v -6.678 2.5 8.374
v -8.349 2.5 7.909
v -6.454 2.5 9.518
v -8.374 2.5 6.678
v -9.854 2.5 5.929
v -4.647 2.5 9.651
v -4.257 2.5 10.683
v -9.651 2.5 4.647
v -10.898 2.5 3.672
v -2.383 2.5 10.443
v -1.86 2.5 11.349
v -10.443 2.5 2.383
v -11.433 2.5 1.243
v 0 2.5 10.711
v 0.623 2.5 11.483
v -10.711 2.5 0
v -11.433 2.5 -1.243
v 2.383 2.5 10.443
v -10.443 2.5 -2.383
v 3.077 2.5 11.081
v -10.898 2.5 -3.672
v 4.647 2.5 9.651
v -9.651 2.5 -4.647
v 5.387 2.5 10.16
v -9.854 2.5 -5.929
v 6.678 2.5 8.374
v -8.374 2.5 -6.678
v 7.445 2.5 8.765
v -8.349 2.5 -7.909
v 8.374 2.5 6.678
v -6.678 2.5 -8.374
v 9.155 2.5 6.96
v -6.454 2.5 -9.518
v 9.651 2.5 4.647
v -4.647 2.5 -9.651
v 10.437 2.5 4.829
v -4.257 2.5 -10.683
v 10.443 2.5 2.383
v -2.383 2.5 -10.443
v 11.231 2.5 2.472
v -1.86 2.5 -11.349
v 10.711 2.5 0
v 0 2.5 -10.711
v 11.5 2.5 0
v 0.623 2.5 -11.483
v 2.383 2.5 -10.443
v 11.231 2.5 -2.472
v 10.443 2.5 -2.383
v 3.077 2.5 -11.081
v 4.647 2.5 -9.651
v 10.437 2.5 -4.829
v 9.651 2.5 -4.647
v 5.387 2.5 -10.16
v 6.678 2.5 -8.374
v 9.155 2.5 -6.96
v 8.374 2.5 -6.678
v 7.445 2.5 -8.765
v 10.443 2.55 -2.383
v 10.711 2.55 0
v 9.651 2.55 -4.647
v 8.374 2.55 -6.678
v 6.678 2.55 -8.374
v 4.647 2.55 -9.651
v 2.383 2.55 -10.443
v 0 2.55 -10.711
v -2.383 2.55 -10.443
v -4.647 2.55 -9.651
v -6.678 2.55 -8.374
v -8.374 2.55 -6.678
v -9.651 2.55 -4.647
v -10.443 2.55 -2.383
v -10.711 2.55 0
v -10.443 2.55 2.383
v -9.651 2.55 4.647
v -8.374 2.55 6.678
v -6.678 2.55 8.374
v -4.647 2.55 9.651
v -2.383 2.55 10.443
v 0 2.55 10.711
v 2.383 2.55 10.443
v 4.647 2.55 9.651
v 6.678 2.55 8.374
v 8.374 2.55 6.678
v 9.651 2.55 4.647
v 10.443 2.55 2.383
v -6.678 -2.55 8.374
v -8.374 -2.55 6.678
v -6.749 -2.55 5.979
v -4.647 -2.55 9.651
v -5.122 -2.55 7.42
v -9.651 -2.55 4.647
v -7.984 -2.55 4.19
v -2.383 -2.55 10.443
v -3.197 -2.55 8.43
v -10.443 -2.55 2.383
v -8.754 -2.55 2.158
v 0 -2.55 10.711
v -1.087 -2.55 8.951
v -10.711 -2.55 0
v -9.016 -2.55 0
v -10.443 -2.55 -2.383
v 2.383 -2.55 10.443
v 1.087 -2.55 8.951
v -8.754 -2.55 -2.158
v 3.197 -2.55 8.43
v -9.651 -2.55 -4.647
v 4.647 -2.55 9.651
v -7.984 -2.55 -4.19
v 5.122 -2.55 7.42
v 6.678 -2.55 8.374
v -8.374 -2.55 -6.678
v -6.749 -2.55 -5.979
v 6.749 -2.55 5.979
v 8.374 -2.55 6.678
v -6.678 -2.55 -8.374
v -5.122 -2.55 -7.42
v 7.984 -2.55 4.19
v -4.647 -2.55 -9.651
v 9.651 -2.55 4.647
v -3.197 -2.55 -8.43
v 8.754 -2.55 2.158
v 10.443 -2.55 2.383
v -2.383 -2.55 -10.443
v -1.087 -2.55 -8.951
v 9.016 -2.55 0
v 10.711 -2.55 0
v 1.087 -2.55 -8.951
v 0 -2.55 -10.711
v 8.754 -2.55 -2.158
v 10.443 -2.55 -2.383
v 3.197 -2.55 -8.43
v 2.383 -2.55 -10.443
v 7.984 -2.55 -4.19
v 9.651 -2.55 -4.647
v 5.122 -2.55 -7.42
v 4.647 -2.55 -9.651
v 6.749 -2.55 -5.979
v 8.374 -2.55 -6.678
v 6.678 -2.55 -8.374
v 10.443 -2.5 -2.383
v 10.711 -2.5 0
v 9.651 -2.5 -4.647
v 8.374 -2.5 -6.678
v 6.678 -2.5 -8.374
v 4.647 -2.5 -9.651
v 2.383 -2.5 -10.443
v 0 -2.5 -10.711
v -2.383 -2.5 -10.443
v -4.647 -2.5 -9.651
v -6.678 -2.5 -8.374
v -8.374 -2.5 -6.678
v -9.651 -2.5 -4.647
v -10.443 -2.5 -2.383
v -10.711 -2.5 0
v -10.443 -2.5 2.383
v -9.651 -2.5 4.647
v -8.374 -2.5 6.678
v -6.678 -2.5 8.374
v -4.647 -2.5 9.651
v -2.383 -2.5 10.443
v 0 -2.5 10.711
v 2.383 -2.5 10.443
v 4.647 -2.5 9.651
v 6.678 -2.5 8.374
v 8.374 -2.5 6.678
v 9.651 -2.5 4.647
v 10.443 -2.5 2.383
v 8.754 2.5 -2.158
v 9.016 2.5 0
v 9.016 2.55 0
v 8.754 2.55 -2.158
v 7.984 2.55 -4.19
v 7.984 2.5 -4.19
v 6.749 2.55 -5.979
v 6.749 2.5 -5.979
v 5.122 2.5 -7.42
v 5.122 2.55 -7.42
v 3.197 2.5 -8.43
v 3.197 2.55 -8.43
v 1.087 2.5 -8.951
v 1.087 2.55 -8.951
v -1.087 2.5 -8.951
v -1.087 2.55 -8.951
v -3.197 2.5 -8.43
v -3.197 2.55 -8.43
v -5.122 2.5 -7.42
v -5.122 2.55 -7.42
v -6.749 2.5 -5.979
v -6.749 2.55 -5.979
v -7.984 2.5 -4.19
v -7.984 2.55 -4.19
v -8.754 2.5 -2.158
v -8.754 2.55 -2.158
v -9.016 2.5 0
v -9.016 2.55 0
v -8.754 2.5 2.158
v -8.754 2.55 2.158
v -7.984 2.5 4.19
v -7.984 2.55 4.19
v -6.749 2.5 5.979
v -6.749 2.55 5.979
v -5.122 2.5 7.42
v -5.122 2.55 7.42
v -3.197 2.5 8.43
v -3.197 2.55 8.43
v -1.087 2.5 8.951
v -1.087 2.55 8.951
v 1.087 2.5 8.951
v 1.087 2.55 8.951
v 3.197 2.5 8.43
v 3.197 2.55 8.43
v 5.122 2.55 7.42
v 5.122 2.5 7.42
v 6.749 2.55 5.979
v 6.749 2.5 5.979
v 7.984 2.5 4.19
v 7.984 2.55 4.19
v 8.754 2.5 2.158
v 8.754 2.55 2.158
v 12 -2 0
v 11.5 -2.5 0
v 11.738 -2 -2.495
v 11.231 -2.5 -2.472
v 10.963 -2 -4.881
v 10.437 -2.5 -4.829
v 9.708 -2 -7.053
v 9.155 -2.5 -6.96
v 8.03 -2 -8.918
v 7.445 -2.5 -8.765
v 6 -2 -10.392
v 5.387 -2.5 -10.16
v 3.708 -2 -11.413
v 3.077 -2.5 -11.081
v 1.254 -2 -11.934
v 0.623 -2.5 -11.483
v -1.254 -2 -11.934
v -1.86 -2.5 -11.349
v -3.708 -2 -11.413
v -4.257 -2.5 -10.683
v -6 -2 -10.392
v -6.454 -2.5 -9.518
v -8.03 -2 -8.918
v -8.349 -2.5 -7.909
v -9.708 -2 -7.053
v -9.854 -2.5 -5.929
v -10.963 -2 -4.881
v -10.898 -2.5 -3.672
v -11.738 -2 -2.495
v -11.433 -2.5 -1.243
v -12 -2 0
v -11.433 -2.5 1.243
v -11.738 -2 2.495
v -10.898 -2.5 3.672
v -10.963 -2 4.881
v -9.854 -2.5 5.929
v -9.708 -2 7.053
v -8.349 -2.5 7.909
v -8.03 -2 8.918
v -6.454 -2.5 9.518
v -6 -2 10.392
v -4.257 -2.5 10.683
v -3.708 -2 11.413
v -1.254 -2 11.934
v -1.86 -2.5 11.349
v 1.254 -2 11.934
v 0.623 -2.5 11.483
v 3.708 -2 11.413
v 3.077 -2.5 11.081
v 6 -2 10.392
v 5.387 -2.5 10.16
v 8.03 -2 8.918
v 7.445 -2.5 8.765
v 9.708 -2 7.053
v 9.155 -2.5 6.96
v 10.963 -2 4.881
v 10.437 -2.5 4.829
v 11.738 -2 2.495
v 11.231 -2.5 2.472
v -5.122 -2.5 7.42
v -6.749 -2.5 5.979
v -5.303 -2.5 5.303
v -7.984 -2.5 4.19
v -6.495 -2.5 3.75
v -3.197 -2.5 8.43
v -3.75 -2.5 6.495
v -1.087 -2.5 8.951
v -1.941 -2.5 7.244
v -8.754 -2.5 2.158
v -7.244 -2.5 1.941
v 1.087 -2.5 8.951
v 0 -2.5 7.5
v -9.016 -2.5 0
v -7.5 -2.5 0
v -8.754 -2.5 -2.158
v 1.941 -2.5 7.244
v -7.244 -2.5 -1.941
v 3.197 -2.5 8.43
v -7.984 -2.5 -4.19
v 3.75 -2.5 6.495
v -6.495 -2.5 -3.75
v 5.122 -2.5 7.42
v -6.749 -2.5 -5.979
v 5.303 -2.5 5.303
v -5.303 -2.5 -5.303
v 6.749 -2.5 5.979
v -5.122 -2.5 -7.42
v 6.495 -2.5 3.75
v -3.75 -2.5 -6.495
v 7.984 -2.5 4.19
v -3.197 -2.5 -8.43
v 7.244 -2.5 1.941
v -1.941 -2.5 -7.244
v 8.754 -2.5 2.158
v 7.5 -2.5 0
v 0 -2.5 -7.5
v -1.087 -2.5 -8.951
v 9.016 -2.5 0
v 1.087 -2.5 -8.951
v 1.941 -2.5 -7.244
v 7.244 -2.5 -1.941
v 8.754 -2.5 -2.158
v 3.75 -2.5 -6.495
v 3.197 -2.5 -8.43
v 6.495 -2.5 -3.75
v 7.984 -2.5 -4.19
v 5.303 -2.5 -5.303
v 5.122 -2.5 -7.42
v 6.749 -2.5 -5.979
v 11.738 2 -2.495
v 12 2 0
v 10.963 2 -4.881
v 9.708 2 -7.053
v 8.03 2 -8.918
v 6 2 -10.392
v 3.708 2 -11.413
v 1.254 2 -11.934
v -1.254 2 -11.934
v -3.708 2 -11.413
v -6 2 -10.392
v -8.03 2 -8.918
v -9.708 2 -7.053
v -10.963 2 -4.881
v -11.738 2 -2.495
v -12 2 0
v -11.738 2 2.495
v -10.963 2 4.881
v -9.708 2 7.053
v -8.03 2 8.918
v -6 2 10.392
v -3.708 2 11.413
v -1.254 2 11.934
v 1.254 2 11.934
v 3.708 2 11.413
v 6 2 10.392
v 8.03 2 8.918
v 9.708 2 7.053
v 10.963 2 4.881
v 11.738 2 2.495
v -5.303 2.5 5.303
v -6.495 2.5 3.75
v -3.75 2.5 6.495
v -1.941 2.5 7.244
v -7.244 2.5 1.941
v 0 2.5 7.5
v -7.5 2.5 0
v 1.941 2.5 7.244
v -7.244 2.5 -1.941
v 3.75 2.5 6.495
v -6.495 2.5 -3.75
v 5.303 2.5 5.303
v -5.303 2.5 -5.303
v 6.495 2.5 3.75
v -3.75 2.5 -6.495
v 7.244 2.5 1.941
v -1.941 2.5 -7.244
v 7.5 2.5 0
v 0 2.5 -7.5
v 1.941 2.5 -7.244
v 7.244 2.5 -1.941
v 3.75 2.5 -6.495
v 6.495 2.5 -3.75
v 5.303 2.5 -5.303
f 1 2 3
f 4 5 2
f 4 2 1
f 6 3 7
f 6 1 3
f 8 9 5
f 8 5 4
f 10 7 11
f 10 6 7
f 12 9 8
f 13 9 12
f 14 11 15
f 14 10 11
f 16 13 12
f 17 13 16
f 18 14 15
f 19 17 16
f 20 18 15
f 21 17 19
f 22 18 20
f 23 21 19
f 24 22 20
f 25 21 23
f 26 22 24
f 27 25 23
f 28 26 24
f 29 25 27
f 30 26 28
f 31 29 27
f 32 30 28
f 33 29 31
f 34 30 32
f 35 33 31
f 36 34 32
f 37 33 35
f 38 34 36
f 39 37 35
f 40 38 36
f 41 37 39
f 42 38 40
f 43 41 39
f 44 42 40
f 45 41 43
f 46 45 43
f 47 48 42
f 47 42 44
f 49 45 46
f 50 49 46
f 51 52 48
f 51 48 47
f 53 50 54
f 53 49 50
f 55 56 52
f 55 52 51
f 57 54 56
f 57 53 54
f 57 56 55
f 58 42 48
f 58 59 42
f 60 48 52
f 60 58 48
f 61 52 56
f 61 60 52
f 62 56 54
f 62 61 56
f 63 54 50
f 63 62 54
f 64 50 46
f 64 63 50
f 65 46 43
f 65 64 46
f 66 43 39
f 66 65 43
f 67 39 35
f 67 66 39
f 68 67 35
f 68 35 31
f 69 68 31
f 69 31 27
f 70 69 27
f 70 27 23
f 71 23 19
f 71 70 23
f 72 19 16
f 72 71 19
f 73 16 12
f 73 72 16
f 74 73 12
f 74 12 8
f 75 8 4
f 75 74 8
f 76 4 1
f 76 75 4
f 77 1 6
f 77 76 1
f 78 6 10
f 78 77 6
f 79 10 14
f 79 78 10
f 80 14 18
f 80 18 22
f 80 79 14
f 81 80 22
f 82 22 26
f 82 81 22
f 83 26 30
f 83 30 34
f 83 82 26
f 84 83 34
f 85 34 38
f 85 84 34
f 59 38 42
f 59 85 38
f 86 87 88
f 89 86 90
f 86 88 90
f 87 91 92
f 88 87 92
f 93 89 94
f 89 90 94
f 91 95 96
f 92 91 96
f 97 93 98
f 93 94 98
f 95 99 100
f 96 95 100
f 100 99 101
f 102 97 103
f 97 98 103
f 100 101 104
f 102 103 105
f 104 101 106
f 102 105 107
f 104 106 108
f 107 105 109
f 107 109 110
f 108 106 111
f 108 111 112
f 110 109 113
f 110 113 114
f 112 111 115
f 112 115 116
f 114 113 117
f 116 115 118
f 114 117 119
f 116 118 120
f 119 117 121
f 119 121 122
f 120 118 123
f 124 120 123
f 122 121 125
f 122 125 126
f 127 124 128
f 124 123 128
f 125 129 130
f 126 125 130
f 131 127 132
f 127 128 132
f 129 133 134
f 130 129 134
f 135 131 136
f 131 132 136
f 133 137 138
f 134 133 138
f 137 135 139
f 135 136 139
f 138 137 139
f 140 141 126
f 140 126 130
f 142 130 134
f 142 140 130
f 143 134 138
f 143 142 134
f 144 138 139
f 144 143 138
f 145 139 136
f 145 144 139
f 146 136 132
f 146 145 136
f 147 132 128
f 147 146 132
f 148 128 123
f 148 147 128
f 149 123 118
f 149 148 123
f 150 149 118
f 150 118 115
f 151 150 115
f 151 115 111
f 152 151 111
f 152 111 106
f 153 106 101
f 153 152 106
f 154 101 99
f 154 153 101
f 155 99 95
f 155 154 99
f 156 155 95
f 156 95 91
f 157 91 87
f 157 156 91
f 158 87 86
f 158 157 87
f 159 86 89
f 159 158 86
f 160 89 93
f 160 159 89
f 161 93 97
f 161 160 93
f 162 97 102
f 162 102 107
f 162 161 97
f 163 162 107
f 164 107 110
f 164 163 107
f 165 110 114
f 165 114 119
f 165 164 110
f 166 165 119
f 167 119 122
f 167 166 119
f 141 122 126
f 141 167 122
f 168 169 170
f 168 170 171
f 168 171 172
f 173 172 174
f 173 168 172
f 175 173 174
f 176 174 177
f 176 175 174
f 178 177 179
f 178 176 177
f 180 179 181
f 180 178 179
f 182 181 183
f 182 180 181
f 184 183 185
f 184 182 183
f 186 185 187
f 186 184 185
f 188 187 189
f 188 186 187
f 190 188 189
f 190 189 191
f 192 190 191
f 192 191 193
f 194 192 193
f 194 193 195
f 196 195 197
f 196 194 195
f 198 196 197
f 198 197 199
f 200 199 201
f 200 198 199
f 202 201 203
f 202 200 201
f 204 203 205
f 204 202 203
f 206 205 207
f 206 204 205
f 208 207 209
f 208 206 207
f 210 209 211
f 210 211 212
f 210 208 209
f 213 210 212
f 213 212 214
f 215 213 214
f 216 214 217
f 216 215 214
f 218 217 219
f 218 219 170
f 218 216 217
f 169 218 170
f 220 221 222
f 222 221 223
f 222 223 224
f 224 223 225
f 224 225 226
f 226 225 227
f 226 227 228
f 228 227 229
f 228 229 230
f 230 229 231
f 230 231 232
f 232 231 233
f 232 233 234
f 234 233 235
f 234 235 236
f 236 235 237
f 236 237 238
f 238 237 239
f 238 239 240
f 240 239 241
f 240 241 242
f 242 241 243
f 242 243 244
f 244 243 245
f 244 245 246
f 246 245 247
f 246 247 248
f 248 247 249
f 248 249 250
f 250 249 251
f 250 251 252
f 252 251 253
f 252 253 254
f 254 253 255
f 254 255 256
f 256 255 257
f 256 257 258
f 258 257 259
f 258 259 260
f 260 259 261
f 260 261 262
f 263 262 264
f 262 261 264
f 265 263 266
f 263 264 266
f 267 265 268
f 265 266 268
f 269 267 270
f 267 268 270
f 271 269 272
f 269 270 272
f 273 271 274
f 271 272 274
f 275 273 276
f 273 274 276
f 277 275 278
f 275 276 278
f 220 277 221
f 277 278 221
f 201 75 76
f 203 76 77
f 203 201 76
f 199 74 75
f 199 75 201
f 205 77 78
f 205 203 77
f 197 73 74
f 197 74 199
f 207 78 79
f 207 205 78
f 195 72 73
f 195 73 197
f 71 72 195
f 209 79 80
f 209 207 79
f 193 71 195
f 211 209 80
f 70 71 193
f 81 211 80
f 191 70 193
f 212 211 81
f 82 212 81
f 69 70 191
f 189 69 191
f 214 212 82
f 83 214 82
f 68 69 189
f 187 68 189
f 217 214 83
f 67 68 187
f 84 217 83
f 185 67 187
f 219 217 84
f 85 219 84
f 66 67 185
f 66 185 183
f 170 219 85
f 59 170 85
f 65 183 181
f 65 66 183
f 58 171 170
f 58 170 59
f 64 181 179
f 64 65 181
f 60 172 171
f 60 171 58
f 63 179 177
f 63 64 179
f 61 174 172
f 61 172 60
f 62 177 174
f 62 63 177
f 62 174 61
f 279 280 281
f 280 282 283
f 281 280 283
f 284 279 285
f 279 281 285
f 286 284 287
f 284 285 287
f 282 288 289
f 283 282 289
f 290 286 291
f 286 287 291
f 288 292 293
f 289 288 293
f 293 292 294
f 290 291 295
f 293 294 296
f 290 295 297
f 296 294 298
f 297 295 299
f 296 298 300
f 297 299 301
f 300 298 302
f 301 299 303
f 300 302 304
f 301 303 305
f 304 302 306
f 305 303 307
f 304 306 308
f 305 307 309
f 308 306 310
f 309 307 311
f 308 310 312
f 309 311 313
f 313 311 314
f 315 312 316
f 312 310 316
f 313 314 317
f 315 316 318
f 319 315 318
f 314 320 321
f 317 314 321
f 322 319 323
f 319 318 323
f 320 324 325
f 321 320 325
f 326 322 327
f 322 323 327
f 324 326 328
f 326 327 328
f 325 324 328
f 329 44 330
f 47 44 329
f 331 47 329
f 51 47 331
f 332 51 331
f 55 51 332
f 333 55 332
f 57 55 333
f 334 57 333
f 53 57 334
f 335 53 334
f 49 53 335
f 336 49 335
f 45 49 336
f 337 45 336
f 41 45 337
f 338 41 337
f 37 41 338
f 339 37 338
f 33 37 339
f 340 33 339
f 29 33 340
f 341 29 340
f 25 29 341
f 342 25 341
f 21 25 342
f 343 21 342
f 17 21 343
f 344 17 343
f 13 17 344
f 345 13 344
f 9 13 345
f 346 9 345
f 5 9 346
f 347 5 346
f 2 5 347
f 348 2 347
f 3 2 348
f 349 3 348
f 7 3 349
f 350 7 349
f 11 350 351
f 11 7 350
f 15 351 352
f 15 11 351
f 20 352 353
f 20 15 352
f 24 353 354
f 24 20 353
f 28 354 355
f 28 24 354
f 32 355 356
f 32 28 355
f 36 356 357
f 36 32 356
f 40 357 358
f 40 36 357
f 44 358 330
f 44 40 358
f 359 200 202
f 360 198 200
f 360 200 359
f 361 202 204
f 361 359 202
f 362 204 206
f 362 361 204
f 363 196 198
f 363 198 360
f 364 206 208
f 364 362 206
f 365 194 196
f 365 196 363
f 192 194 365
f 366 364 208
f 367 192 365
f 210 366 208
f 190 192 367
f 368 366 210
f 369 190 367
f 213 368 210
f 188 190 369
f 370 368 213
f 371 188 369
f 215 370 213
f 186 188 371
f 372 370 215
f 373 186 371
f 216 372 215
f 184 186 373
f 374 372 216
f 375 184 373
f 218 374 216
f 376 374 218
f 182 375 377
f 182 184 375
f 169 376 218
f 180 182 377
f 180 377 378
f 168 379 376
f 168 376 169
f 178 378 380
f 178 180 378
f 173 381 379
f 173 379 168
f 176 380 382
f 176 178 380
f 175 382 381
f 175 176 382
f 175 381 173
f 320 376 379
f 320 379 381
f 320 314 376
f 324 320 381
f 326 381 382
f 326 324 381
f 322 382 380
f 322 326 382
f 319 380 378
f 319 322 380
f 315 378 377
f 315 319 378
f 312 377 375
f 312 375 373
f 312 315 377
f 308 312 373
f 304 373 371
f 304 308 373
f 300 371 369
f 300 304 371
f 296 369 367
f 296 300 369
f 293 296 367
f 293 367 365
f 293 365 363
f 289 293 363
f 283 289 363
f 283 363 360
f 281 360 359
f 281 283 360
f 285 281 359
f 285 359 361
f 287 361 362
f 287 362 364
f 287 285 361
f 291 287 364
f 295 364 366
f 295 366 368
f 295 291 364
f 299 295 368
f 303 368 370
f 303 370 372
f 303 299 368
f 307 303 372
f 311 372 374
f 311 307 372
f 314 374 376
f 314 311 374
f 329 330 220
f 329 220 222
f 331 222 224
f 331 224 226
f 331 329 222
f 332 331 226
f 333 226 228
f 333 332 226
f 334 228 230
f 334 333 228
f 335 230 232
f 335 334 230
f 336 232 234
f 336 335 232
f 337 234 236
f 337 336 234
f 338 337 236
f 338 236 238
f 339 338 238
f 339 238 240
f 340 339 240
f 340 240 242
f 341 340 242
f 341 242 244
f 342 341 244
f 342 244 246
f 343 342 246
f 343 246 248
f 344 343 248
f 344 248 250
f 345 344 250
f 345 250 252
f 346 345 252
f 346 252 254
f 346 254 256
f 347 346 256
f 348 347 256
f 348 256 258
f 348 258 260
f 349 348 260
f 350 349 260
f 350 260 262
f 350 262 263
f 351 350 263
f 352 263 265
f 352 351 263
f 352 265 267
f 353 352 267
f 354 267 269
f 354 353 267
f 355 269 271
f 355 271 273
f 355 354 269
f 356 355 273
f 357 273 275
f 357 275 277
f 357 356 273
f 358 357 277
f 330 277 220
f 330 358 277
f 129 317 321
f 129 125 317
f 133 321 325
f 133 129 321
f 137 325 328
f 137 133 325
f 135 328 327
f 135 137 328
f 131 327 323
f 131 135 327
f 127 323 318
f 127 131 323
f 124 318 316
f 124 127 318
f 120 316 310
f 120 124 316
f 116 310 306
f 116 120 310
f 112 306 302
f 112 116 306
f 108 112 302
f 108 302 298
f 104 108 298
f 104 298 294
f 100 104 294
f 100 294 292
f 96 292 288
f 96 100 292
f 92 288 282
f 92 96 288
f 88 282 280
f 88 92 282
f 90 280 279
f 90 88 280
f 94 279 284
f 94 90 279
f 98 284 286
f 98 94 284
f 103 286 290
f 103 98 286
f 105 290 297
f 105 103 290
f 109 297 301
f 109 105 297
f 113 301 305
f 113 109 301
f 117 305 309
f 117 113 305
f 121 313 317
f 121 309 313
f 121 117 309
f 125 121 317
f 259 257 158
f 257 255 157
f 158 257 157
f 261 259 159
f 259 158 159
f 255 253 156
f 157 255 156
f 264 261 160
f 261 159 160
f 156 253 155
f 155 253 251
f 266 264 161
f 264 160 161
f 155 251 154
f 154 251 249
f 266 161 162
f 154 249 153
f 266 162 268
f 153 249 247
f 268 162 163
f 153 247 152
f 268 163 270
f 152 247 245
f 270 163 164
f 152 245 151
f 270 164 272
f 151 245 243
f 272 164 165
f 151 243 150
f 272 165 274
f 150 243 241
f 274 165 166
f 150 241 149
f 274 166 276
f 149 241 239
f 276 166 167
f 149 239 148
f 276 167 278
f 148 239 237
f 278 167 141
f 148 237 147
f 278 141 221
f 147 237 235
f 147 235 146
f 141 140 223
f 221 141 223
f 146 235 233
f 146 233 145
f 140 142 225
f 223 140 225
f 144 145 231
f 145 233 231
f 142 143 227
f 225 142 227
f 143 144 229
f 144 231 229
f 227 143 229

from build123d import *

# Parameters (mm, degrees)
CROQUIS1_R              = 12
CROQUIS1_R_2            = 7.5
SALIENTE_EXTRUIR1_DEPTH = 2.5
CHAFL_N1_SIZE           = 0.5
CROQUIS2_R              = 10.711337482
CROQUIS2_R_2            = 9.016362729
SALIENTE_EXTRUIR2_DEPTH = 2.55


with BuildPart() as part:
    # Croquis1 → Saliente-Extruir1 (new body, symmetric)
    with BuildSketch(Plane(origin=(0, 0, 0), x_dir=(1, 0, 0), z_dir=(0, 1, 0))):
        Circle(CROQUIS1_R)
        Circle(CROQUIS1_R_2, mode=Mode.SUBTRACT)
    extrude(amount=SALIENTE_EXTRUIR1_DEPTH, both=True)

    # Chaflán1
    chafl_n1_edges = [part.edges().sort_by_distance(p)[0] for p in [
        (-12, -2.5, 0),
        (-12, 2.5, 0),
    ]]
    chamfer(chafl_n1_edges, length=CHAFL_N1_SIZE)

    # Croquis2 → Saliente-Extruir2 (add, symmetric)
    with BuildSketch(Plane(origin=(0, 0, 0), x_dir=(1, 0, 0), z_dir=(0, 1, 0))):
        Circle(CROQUIS2_R)
        Circle(CROQUIS2_R_2, mode=Mode.SUBTRACT)
    extrude(amount=SALIENTE_EXTRUIR2_DEPTH, both=True)


solid = part.part
